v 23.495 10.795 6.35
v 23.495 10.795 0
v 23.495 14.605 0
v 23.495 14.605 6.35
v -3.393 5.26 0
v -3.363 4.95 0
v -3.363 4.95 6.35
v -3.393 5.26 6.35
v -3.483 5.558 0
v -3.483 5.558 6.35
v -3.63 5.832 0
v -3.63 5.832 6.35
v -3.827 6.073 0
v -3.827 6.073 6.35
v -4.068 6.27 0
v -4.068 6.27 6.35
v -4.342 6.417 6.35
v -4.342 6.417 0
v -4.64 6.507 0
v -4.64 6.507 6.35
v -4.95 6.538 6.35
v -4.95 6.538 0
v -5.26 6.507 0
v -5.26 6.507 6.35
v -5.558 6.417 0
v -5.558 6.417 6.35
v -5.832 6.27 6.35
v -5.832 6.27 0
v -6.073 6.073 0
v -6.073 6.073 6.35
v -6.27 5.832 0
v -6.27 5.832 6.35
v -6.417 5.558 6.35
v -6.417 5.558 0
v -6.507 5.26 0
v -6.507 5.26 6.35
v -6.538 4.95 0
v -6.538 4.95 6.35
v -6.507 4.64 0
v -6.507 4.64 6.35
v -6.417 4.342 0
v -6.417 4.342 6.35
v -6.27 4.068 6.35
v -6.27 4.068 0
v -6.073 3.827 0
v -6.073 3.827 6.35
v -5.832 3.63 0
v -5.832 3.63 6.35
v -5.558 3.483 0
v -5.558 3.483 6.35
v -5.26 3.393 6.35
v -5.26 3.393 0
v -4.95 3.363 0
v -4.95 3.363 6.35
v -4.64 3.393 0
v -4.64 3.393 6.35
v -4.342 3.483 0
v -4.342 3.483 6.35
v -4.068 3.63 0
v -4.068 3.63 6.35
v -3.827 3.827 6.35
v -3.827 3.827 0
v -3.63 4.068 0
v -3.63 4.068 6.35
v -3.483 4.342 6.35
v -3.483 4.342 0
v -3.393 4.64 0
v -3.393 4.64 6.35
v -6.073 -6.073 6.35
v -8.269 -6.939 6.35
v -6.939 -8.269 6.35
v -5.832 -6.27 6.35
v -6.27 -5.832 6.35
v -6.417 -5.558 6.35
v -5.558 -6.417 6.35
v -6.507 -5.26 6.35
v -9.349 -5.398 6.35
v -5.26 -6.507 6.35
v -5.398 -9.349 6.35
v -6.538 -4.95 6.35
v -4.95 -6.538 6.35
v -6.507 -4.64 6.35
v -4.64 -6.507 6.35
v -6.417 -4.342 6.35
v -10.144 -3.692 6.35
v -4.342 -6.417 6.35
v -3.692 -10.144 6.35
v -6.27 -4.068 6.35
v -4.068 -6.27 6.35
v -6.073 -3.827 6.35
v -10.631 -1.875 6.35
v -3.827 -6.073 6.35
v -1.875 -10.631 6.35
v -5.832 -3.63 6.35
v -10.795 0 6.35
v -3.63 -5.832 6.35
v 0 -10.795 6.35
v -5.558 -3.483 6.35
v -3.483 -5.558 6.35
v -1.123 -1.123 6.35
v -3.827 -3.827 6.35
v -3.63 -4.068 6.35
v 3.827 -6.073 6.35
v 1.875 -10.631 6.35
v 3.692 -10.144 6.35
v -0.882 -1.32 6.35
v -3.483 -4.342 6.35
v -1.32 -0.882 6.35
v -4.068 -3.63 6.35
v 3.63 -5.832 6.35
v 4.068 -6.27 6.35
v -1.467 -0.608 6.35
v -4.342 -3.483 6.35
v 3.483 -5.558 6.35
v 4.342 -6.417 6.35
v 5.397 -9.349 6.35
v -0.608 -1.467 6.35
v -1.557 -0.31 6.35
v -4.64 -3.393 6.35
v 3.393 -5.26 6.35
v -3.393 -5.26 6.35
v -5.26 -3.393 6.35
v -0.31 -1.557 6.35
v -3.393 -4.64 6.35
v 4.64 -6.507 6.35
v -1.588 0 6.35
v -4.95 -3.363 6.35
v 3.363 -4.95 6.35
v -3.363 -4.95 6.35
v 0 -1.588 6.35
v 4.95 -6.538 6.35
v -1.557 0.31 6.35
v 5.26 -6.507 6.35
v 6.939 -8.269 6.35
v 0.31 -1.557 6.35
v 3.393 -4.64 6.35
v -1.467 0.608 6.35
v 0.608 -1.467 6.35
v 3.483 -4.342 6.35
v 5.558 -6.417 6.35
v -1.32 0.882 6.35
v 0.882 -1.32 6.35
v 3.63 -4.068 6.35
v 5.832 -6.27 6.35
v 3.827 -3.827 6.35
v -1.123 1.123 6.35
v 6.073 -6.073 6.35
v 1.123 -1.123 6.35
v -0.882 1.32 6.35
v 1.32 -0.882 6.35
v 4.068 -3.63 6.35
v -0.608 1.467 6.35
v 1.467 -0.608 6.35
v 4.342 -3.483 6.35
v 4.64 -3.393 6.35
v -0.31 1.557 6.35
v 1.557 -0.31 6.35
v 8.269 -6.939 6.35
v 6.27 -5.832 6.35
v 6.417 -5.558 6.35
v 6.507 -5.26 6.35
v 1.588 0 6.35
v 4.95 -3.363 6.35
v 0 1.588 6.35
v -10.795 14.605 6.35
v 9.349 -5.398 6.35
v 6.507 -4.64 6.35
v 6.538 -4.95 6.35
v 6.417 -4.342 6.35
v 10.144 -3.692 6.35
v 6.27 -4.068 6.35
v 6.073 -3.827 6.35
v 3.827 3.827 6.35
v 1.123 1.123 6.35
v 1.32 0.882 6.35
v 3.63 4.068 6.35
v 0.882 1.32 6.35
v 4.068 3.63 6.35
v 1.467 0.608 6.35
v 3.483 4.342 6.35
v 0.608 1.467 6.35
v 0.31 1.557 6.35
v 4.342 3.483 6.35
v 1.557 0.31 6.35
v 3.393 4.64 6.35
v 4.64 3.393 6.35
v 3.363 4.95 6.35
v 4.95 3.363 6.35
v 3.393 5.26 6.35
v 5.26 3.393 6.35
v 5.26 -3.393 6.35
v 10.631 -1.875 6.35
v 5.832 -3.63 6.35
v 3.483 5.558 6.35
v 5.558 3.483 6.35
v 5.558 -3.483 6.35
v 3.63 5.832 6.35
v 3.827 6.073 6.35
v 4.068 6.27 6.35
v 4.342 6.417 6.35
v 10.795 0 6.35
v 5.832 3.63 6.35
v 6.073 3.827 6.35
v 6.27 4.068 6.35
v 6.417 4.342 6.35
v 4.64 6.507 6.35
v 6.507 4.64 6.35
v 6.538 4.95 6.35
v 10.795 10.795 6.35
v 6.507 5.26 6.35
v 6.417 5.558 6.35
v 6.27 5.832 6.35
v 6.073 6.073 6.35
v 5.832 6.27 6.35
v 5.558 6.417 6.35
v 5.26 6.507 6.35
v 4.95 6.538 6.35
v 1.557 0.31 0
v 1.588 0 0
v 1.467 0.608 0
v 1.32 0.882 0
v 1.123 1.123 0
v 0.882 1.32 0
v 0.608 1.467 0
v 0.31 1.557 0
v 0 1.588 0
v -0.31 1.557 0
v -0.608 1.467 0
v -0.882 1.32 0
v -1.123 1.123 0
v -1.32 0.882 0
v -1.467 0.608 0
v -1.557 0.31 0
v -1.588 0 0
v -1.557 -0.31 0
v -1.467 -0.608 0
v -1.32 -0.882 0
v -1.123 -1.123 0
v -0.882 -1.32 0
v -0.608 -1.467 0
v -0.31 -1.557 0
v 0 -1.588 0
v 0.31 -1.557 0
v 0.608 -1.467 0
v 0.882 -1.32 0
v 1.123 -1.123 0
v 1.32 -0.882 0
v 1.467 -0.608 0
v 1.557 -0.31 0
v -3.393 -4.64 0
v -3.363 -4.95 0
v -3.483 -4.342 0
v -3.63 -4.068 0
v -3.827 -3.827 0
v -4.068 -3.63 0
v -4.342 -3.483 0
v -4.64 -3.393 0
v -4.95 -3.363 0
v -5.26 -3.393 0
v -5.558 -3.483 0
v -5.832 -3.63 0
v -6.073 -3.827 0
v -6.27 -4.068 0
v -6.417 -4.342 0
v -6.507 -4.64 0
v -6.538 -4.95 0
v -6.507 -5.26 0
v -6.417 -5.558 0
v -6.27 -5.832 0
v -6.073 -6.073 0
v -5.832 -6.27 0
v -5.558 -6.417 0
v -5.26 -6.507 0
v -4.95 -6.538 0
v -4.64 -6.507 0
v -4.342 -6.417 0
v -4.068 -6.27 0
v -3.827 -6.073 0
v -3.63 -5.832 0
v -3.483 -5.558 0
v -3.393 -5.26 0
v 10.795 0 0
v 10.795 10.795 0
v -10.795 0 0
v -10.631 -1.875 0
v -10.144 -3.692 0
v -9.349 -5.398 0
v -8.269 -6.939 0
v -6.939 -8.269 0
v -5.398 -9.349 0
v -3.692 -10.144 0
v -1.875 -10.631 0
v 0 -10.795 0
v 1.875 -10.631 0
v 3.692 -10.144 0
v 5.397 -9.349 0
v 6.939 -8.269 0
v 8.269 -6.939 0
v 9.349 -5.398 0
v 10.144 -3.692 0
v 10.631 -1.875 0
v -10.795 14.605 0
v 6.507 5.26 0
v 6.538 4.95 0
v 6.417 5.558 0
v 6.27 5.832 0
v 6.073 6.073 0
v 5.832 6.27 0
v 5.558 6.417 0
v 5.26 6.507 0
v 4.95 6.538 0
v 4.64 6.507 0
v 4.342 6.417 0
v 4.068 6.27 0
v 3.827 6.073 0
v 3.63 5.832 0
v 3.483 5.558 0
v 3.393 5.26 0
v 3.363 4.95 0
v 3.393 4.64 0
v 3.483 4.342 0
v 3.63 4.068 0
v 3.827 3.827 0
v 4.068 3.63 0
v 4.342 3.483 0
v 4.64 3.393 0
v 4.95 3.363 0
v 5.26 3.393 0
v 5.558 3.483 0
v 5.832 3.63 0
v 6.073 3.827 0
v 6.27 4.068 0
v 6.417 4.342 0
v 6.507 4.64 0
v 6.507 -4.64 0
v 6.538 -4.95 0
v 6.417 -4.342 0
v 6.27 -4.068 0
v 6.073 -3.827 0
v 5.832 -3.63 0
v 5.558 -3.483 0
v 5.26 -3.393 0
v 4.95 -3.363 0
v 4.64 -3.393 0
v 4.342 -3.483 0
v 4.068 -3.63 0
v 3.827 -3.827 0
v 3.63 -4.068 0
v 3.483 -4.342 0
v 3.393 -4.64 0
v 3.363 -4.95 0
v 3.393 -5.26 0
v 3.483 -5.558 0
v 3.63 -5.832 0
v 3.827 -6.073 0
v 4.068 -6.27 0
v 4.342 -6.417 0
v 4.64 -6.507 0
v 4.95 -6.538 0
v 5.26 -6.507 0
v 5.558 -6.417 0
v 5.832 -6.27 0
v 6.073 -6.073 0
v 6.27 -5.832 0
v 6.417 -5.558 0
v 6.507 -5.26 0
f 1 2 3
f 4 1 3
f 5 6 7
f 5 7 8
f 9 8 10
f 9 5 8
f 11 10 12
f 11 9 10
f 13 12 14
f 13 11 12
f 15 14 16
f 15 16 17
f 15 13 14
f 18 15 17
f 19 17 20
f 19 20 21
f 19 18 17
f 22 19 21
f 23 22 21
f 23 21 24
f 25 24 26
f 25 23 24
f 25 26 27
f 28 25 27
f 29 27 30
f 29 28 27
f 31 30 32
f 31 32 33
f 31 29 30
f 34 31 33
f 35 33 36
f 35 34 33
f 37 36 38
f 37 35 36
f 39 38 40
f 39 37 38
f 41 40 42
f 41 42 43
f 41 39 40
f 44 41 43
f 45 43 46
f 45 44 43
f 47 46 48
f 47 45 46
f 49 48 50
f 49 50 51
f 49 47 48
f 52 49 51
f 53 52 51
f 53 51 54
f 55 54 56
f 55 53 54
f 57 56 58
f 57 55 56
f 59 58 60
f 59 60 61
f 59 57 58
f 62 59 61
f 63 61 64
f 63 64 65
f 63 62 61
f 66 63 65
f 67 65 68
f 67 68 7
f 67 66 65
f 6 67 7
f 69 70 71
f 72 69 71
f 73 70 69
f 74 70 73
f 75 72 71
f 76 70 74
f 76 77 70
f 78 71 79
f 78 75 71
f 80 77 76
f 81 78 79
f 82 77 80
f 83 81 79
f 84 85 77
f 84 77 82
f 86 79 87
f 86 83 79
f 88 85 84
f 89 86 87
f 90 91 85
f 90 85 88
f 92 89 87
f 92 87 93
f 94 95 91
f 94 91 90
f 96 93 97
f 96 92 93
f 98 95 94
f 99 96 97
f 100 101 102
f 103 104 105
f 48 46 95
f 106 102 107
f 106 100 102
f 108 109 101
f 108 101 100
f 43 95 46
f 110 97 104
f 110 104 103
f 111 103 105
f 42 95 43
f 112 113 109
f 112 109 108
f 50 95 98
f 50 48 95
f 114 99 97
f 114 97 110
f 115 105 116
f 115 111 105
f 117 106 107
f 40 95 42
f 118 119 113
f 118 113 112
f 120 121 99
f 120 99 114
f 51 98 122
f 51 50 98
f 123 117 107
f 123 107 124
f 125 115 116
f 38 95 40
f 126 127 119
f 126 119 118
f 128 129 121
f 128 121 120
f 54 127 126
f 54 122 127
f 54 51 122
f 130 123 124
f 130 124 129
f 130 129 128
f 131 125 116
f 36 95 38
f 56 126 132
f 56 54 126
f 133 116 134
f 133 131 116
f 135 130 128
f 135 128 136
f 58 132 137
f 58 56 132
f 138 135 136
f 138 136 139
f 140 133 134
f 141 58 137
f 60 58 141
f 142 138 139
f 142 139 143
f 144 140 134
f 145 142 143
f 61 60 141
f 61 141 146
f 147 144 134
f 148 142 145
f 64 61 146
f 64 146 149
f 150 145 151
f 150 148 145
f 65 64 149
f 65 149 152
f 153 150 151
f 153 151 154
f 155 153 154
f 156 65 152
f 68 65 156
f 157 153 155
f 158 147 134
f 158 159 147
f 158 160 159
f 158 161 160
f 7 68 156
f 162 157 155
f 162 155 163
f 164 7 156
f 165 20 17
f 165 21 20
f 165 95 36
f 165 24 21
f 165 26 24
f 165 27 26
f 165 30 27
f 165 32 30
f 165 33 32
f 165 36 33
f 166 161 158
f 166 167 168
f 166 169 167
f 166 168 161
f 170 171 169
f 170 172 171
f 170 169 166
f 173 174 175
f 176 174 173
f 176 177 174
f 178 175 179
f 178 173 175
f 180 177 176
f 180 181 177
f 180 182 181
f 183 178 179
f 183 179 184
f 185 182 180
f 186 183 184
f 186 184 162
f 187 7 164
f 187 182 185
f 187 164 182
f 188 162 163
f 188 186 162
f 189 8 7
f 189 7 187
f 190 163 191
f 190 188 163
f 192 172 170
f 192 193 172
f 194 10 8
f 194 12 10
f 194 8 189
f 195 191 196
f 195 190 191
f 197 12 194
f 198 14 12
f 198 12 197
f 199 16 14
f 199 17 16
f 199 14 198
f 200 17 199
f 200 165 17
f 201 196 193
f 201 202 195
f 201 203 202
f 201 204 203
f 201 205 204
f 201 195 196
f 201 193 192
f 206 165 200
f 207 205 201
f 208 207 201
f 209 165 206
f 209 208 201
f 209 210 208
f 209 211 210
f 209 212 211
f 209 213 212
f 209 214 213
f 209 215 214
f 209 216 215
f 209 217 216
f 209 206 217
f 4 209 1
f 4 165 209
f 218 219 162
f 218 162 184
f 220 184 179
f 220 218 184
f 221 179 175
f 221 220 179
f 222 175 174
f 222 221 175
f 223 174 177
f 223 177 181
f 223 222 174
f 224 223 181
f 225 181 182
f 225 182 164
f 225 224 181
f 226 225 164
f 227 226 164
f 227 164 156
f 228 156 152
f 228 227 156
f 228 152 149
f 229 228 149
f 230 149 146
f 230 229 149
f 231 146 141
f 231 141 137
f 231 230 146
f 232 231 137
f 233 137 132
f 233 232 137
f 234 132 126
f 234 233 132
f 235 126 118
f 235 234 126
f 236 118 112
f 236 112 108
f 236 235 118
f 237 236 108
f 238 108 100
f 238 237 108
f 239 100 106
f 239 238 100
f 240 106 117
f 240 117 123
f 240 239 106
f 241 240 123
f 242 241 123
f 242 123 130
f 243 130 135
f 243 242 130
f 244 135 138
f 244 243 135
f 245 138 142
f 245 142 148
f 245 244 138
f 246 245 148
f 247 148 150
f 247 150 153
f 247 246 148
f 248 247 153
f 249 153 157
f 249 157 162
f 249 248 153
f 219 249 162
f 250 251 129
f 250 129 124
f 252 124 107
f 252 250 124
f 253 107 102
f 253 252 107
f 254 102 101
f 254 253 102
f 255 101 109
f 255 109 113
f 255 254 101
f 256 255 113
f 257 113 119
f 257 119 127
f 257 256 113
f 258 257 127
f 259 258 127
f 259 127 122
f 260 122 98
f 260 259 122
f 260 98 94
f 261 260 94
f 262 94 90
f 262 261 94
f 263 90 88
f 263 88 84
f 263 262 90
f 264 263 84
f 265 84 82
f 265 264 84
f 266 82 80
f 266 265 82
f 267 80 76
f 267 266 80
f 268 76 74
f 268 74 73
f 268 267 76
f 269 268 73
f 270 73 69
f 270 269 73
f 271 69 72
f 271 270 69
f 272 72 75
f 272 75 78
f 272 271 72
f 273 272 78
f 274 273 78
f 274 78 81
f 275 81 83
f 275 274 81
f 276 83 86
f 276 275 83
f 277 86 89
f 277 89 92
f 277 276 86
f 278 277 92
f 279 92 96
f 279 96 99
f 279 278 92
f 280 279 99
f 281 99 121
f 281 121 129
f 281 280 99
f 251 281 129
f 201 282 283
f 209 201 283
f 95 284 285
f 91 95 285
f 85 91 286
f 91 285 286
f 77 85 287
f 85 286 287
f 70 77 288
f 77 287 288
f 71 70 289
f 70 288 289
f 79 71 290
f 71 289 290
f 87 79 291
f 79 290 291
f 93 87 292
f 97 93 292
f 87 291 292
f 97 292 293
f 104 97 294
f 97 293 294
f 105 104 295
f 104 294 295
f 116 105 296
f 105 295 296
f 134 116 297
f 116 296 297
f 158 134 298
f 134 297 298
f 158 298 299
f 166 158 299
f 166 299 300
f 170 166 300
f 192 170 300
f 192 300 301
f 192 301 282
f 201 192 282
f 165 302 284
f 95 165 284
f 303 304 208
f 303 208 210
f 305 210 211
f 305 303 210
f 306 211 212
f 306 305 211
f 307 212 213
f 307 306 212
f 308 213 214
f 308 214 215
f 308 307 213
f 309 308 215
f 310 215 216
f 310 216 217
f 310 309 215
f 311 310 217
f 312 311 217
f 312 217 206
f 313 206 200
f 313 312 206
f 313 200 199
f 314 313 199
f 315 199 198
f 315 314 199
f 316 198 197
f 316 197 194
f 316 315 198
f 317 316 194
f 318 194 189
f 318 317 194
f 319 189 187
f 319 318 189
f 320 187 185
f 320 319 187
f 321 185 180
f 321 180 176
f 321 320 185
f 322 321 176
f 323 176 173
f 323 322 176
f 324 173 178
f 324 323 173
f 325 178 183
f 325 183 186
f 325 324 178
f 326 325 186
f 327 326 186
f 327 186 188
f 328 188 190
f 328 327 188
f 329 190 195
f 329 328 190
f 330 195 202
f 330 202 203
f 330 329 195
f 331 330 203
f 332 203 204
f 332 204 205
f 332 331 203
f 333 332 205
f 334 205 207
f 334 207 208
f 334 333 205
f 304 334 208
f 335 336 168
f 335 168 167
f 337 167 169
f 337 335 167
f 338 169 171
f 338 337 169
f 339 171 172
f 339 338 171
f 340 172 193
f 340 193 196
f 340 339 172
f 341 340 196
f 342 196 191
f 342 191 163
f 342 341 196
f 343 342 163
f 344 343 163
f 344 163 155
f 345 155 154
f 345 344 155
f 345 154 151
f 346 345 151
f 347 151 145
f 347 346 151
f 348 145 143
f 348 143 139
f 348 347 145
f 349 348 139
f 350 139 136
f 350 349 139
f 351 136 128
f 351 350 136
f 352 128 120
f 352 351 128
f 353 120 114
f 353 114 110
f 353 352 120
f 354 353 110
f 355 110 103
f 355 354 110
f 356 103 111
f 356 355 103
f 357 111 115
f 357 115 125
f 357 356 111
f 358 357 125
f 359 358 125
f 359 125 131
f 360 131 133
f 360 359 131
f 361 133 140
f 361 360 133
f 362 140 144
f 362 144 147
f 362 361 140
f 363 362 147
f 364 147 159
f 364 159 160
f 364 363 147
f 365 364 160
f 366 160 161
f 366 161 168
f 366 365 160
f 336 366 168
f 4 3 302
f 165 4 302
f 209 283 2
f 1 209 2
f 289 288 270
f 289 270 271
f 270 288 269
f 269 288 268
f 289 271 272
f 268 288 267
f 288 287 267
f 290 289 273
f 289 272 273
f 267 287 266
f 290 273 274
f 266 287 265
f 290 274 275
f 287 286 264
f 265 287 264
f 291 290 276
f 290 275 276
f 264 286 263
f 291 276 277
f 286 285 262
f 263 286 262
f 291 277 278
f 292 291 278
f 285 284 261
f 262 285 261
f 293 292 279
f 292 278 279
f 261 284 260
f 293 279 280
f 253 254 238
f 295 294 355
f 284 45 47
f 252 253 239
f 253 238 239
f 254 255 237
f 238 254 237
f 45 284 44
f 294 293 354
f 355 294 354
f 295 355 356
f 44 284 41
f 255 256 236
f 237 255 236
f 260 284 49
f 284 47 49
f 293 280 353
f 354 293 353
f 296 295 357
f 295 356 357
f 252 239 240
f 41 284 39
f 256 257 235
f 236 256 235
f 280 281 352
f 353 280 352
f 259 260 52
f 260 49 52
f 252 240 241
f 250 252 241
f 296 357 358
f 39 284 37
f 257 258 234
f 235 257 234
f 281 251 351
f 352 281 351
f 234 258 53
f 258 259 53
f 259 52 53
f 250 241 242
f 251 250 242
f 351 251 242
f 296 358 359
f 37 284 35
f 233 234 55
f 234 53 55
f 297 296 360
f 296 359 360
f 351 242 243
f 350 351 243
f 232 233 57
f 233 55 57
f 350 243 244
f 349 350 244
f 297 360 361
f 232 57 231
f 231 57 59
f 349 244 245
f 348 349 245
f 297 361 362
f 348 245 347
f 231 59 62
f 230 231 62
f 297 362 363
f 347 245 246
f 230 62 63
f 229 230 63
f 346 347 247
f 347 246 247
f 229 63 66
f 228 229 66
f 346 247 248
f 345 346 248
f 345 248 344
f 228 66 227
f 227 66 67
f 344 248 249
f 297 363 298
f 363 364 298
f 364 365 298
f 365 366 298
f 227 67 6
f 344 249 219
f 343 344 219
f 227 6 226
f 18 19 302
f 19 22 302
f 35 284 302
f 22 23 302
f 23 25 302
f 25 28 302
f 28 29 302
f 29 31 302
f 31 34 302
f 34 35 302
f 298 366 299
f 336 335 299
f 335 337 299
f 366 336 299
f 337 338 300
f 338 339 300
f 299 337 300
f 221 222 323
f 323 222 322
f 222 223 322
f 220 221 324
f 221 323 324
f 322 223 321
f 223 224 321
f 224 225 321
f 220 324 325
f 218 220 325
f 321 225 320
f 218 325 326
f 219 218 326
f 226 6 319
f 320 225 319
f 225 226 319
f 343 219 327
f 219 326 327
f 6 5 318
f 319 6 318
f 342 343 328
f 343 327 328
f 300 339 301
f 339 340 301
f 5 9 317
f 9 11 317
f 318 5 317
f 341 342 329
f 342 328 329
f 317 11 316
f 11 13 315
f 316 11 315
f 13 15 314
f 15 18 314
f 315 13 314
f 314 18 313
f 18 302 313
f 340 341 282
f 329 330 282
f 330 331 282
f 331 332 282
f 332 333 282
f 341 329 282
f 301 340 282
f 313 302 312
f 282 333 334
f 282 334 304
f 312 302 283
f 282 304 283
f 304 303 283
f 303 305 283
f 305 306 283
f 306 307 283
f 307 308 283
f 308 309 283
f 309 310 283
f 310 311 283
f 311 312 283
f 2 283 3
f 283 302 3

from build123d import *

# Parameters (mm, degrees)
SKETCH1_R           = 1.5875
BOSS_EXTRUDE1_DEPTH = 6.35


with BuildPart() as part:
    # Sketch1 → Boss-Extrude1 (new body)
    with BuildSketch(Plane.XY):
        with BuildLine():
            Line((10.795, 0), (10.795, 10.795))
            Line((10.795, 10.795), (23.495, 10.795))
            Line((23.495, 10.795), (23.495, 14.605))
            Line((23.495, 14.605), (-10.795, 14.605))
            Line((-10.795, 14.605), (-10.795, 0))
            ThreePointArc((-10.795, 0), (0, -10.795), (10.795, 0))
        make_face()
        Circle(SKETCH1_R, mode=Mode.SUBTRACT)
        with Locations((-4.95, 4.95)):
            Circle(SKETCH1_R, mode=Mode.SUBTRACT)
        with Locations((-4.95, -4.95)):
            Circle(SKETCH1_R, mode=Mode.SUBTRACT)
        with Locations((4.95, -4.95)):
            Circle(SKETCH1_R, mode=Mode.SUBTRACT)
        with Locations((4.95, 4.95)):
            Circle(SKETCH1_R, mode=Mode.SUBTRACT)
    extrude(amount=BOSS_EXTRUDE1_DEPTH)


solid = part.part
